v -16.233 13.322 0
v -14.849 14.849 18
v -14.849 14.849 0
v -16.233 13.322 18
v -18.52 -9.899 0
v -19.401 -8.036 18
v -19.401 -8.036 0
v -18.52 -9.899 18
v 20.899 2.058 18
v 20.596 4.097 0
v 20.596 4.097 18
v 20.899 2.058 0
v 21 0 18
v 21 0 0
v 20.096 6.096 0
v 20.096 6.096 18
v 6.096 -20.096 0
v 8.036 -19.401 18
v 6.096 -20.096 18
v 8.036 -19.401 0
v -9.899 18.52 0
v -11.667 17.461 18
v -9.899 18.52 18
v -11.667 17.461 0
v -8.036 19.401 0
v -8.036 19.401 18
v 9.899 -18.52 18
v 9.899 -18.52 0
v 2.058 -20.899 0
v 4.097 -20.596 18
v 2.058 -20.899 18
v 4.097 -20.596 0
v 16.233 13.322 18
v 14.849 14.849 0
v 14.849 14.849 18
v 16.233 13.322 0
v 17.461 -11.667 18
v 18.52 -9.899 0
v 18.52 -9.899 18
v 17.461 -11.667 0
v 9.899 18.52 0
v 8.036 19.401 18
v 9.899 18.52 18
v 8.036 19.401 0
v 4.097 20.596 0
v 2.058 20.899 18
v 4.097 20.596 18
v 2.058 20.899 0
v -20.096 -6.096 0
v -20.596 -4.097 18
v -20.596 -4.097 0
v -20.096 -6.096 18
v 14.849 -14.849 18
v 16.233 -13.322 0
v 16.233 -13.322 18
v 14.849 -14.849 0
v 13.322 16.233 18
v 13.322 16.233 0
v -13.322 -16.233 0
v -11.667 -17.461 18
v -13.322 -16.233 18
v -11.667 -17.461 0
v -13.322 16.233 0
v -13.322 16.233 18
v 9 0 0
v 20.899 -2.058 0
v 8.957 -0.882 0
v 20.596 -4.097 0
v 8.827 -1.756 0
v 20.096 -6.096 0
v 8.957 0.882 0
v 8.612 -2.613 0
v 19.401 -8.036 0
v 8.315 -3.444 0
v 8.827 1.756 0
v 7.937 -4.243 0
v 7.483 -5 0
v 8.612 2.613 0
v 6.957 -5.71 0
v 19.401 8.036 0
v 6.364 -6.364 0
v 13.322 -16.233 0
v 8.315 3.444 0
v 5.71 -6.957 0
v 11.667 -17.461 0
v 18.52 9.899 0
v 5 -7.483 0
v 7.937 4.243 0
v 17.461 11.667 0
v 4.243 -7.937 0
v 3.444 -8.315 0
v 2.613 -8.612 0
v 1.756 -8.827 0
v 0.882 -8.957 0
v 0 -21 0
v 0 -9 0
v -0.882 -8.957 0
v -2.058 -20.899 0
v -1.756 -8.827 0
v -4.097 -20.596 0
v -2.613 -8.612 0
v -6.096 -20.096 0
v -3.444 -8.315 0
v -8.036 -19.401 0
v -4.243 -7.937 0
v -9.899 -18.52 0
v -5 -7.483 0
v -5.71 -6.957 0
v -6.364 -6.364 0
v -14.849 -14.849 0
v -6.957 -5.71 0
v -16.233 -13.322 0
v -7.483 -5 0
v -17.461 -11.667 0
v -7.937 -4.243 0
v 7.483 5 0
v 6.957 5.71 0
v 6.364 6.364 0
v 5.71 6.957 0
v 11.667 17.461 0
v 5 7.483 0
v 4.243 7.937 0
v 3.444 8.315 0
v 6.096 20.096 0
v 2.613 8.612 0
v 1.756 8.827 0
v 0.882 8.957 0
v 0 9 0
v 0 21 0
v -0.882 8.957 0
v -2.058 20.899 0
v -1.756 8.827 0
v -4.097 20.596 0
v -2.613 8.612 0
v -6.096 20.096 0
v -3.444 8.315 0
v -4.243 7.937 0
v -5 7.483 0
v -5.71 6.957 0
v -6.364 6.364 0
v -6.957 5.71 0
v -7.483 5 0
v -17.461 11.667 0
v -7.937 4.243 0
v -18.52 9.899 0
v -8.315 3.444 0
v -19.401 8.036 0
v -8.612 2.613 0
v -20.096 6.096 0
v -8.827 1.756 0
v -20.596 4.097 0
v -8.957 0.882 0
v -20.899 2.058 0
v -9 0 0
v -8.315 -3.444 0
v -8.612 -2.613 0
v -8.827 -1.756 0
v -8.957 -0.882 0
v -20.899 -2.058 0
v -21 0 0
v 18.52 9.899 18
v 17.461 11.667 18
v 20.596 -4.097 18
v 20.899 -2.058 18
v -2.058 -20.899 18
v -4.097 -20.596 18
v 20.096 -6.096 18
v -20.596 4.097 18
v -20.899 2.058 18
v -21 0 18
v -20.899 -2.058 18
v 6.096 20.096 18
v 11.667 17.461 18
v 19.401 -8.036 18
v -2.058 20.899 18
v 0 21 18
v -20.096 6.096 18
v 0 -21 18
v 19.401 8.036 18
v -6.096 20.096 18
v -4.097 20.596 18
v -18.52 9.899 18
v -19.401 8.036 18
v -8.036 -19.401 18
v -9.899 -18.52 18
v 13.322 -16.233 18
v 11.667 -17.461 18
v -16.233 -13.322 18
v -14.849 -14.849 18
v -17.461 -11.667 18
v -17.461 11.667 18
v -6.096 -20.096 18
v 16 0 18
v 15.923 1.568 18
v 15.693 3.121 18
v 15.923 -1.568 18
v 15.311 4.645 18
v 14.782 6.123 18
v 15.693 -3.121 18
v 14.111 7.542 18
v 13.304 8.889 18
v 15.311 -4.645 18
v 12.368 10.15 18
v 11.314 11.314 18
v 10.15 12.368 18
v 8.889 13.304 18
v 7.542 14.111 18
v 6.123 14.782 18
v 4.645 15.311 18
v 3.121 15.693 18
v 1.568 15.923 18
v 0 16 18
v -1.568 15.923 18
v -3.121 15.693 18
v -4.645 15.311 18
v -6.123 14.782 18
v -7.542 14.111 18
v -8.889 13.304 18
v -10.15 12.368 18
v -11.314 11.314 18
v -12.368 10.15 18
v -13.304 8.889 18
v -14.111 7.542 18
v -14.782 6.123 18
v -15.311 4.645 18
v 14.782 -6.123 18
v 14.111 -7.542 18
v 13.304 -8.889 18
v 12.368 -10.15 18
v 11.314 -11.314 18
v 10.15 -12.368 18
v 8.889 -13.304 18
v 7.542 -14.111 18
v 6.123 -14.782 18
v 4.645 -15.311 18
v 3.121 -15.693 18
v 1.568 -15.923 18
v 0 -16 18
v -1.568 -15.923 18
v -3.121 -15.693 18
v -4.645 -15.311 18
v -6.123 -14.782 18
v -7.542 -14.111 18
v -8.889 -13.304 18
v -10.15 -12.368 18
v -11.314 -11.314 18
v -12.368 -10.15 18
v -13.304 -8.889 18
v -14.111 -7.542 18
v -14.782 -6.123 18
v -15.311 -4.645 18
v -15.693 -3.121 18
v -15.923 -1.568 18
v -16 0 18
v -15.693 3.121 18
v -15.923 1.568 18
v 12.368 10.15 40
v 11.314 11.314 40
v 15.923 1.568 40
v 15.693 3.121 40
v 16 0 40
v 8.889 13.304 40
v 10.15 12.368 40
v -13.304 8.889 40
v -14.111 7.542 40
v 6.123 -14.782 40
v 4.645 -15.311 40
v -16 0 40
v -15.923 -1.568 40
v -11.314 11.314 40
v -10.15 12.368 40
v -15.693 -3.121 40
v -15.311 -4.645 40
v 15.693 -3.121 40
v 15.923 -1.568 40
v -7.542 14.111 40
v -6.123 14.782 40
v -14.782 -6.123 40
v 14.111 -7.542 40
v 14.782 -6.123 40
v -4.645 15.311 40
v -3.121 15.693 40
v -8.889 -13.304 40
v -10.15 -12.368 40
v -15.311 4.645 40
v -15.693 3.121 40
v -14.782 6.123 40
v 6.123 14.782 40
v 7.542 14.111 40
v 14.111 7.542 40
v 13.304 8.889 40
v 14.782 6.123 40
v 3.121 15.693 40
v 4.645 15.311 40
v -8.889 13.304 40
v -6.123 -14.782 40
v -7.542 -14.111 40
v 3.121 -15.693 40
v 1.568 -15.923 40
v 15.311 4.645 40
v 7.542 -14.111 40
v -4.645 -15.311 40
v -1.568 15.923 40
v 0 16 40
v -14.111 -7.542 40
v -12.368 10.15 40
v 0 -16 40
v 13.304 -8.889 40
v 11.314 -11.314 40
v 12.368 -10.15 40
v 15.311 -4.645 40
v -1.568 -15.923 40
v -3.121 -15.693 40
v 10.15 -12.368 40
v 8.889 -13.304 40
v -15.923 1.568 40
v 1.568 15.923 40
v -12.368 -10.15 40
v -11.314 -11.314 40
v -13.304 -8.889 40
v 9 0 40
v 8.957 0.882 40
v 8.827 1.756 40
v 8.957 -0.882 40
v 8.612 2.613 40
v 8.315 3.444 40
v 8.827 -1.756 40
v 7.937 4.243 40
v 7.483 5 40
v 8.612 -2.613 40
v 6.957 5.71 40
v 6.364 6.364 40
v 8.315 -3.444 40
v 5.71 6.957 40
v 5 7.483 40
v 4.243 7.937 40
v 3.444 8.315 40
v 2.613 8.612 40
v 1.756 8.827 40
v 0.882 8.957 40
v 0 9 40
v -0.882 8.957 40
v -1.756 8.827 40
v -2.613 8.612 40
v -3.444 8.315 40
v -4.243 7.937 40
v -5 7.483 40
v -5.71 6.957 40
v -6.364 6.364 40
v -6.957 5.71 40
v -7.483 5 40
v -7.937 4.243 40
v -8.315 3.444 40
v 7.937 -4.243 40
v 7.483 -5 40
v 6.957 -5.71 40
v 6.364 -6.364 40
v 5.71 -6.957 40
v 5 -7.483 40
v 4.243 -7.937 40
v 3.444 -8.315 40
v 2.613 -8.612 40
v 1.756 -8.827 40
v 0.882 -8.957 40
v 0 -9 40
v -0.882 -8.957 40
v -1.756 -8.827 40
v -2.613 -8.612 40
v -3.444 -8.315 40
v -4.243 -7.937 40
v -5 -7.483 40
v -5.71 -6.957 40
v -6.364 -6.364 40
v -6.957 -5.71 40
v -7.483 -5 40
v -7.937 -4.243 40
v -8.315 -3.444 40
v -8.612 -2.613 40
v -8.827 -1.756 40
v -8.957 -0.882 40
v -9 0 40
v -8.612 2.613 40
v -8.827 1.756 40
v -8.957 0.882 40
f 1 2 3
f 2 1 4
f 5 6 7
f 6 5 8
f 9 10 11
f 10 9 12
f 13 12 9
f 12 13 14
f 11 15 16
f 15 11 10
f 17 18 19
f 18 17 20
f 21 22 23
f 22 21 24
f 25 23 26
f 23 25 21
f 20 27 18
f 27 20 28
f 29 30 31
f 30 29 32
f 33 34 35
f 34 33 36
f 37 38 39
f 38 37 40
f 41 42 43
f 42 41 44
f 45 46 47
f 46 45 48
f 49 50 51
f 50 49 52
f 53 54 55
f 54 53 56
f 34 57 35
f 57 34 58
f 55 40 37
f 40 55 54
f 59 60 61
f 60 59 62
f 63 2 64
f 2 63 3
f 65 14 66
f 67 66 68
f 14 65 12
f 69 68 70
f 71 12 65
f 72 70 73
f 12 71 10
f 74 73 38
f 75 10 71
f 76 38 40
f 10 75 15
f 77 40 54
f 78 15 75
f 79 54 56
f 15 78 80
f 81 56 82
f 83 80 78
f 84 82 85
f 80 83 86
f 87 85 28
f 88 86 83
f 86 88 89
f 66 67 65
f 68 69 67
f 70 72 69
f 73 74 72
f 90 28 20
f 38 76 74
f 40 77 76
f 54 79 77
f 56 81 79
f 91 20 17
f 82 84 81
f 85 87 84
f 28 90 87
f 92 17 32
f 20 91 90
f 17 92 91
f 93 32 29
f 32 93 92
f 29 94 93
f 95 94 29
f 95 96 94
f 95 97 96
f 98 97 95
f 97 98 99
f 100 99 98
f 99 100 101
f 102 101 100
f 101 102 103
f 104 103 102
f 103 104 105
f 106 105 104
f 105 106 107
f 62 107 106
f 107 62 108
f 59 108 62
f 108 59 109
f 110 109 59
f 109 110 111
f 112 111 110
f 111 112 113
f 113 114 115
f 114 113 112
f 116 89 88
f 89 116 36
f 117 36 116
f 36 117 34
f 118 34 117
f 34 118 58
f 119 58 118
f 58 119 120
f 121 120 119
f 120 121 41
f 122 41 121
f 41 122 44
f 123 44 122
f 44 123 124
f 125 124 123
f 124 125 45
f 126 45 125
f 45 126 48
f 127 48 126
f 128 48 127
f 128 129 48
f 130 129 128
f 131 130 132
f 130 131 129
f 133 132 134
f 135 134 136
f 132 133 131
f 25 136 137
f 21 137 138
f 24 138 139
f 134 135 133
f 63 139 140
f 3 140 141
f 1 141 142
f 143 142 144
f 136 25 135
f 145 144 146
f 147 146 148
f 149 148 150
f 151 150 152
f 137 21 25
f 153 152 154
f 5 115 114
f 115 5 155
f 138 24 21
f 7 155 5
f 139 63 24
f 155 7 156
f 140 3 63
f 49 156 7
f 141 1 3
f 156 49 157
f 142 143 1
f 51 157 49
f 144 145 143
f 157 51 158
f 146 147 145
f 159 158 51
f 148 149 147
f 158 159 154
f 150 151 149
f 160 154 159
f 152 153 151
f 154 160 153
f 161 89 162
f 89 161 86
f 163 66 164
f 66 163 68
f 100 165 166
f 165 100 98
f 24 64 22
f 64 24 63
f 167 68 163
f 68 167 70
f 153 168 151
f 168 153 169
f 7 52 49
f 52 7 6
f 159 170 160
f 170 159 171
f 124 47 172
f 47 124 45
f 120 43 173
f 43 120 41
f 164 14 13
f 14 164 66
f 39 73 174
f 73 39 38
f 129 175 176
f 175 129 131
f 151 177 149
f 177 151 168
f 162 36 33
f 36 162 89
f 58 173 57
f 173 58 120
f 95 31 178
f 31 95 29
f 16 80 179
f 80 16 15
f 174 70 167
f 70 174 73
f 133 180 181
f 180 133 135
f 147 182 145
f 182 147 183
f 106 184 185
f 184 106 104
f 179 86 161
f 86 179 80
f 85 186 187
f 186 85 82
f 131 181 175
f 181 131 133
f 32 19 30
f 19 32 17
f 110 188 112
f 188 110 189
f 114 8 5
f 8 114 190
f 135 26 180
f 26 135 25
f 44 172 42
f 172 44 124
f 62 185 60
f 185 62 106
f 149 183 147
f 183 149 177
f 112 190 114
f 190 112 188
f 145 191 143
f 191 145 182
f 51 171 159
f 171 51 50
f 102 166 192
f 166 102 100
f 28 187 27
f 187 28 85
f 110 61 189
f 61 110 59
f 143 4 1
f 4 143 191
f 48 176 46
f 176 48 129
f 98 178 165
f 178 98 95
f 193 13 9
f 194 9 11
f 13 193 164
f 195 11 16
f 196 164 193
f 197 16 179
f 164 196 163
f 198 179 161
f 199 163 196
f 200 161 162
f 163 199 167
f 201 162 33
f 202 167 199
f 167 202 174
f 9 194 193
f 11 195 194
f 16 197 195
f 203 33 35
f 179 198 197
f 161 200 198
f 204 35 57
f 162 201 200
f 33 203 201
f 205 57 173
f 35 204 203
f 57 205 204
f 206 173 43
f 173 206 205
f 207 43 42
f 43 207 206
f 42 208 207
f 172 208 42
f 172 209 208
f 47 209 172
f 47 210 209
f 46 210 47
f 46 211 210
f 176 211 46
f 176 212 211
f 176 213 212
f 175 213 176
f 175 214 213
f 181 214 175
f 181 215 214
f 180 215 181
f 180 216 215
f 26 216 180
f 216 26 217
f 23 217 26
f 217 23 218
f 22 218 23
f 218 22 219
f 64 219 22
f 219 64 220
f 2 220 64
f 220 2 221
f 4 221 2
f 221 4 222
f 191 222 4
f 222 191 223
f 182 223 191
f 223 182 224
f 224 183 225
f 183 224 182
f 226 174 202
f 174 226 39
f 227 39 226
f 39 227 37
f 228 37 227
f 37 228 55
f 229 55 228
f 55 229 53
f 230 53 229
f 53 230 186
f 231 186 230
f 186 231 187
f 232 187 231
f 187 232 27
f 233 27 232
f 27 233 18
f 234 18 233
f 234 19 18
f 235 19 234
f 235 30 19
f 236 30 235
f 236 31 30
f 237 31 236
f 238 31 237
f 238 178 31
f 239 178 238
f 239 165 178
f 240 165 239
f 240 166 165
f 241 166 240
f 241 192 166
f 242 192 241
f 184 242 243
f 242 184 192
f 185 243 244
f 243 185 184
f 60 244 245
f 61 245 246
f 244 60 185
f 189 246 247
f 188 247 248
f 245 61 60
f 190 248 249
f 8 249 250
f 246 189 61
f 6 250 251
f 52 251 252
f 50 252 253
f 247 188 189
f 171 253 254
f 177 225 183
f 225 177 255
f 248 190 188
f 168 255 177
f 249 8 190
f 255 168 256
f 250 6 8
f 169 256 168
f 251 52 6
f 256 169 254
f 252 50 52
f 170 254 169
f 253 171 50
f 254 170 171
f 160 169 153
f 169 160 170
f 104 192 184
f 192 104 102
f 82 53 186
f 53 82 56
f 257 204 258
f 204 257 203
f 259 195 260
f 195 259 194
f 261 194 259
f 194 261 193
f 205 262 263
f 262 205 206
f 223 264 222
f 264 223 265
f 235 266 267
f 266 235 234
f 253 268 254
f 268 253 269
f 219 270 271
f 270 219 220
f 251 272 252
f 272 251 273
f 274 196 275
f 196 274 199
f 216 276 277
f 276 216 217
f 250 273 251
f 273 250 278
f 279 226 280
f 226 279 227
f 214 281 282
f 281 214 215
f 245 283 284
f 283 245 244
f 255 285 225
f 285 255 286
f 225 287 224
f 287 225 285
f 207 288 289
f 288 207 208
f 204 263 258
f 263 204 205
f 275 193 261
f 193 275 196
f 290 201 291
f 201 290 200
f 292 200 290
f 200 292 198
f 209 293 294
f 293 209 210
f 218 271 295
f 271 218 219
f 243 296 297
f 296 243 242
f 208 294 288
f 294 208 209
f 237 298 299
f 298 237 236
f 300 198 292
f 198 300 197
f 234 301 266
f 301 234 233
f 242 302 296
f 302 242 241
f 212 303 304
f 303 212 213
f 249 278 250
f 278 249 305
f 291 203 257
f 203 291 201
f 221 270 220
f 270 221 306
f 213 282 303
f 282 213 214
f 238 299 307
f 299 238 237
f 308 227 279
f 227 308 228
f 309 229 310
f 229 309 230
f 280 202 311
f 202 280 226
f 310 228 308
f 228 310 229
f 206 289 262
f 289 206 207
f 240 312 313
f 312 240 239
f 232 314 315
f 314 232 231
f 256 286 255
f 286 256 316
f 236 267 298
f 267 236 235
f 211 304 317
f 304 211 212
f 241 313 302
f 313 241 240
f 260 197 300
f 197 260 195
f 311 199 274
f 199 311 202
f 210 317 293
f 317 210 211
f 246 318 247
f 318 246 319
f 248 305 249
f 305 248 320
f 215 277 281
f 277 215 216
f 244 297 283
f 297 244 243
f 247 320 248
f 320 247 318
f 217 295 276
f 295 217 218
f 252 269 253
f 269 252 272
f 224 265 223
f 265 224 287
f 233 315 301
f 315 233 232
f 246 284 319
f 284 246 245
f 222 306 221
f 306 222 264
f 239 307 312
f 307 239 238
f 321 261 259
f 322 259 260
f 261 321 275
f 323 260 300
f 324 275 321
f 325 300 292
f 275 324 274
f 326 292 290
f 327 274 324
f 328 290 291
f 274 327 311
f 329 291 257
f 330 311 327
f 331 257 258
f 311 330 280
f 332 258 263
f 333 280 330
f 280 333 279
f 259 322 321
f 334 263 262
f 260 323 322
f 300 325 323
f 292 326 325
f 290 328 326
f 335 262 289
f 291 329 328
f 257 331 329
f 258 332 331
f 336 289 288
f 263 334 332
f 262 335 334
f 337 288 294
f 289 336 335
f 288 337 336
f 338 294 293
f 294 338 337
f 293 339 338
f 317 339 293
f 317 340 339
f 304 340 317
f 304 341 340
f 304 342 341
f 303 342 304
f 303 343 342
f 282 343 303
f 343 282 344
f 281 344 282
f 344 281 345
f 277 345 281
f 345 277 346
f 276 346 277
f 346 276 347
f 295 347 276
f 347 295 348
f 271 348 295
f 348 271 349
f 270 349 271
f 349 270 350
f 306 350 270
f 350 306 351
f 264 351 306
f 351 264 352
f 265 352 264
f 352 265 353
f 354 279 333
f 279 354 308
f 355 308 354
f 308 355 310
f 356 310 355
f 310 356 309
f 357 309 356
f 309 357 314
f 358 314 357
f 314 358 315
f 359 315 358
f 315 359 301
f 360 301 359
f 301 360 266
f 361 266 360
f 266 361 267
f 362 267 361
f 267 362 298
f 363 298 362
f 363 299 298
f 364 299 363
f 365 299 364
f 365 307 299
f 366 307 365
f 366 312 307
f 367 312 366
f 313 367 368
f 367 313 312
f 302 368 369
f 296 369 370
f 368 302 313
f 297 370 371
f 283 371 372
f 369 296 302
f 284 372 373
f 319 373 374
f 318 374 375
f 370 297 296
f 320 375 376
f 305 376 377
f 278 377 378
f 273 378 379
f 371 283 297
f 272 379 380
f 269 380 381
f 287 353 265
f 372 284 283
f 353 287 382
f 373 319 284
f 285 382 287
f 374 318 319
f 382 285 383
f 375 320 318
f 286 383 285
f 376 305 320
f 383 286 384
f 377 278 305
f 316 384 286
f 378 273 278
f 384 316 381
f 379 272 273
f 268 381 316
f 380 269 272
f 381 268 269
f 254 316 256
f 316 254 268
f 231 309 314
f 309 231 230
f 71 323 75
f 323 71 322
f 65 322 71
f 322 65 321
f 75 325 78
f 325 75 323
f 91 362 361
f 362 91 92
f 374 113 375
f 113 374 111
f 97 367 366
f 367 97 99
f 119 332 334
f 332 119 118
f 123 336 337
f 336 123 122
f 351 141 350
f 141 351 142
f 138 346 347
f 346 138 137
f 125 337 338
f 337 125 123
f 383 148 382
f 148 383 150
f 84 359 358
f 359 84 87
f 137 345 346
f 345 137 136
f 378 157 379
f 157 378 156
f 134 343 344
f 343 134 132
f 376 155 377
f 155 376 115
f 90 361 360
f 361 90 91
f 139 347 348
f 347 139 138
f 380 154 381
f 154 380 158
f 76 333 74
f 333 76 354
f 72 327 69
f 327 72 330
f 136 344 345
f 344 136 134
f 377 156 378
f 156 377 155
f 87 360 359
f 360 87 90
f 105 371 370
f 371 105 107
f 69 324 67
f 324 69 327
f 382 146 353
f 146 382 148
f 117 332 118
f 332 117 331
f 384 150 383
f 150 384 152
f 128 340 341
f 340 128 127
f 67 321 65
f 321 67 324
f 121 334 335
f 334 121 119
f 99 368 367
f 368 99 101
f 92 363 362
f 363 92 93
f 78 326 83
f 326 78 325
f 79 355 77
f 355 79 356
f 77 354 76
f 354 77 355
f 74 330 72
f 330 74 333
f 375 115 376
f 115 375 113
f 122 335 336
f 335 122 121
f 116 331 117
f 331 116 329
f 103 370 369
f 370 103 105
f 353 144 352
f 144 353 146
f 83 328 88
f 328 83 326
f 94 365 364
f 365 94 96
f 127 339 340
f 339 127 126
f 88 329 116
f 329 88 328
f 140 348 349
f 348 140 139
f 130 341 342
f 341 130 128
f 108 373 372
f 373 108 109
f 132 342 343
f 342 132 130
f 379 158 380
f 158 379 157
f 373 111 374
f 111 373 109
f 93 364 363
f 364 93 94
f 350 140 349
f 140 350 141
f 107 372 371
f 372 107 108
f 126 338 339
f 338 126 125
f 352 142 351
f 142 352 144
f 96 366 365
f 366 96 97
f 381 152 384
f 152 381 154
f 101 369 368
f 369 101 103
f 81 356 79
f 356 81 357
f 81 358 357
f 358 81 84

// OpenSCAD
// Generated with SolidPython2 for OpenSCAD task-004
$fn = 64;

difference() {
	union() {
		translate(v = [0, 0, 0]) {
			cylinder(h = 18, r = 21.0);
		}
		translate(v = [0, 0, 18]) {
			cylinder(h = 22, r = 16.0);
		}
	}
	translate(v = [0, 0, -1]) {
		cylinder(h = 42, r = 9.0);
	}
}
